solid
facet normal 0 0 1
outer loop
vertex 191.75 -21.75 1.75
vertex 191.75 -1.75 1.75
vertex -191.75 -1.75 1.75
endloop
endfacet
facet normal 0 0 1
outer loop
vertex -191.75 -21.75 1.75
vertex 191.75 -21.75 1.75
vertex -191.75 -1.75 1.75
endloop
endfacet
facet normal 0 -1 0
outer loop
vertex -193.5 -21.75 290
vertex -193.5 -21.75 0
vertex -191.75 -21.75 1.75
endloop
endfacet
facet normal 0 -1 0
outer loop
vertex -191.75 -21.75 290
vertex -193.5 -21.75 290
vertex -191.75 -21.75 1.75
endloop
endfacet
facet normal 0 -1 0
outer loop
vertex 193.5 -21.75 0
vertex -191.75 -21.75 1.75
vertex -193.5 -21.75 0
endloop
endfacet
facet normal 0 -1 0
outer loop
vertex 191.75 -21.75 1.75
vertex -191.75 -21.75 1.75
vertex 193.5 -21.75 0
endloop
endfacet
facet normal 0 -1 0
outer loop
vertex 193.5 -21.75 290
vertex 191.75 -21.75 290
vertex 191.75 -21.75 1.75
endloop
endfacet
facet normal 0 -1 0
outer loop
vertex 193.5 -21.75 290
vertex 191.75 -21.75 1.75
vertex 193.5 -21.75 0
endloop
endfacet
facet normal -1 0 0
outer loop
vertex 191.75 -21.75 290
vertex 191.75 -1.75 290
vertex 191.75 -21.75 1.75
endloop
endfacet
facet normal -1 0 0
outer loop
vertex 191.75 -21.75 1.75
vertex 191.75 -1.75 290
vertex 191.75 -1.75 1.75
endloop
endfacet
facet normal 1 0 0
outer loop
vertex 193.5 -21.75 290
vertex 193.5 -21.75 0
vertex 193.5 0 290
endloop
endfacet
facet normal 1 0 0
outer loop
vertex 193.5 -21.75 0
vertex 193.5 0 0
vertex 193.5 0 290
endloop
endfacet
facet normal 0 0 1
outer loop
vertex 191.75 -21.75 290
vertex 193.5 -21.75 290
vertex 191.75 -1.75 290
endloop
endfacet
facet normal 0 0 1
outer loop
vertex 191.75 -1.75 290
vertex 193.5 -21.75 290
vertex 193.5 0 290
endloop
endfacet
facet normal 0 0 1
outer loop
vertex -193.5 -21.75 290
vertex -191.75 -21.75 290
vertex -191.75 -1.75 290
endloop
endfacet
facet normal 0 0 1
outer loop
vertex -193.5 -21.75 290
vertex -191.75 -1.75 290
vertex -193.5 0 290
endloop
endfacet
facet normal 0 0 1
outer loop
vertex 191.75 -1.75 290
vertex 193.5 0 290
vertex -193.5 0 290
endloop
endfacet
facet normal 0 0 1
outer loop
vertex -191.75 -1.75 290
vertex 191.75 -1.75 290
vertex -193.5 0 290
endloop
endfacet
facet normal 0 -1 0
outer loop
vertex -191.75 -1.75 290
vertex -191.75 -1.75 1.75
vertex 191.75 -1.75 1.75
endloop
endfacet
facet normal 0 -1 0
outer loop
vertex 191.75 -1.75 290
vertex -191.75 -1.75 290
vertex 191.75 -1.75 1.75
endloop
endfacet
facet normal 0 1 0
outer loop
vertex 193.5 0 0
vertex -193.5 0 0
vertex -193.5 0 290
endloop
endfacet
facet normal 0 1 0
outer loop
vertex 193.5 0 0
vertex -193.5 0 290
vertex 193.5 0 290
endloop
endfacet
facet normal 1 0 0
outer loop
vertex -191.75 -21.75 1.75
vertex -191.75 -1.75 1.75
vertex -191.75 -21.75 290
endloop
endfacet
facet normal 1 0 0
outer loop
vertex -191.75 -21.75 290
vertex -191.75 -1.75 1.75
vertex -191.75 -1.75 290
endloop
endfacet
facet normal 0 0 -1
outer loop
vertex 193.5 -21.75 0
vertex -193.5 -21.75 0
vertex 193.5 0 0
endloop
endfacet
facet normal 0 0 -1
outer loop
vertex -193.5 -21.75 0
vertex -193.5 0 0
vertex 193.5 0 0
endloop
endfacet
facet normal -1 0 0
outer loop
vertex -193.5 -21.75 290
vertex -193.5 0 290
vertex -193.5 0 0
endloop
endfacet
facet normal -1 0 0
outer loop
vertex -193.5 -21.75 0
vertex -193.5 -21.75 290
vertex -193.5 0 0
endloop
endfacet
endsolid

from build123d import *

# Parameters (mm, degrees)
SZKIC1_W                    = 387
SZKIC1_H                    = 1.75
DODANIE_WYCI_GNI_CIE1_DEPTH = 290
DODANIE_WYCI_GNI_CIE2_DEPTH = 20


with BuildPart() as part:
    # Szkic1 → Dodanie-wyciągnięcie1 (new body)
    with BuildSketch(Plane.XY):
        with Locations((0, -0.875)):
            Rectangle(SZKIC1_W, SZKIC1_H)
    extrude(amount=DODANIE_WYCI_GNI_CIE1_DEPTH)

    # Szkic2 → Dodanie-wyciągnięcie2 (add)
    with BuildSketch(Plane.XZ.offset(1.75)):
        Polygon((-193.5, 290), (-193.5, 0), (193.5, 0), (193.5, 290), (191.75, 290), (191.75, 1.75), (-191.75, 1.75), (-191.75, 290), align=None)
    extrude(amount=DODANIE_WYCI_GNI_CIE2_DEPTH)


solid = part.part
